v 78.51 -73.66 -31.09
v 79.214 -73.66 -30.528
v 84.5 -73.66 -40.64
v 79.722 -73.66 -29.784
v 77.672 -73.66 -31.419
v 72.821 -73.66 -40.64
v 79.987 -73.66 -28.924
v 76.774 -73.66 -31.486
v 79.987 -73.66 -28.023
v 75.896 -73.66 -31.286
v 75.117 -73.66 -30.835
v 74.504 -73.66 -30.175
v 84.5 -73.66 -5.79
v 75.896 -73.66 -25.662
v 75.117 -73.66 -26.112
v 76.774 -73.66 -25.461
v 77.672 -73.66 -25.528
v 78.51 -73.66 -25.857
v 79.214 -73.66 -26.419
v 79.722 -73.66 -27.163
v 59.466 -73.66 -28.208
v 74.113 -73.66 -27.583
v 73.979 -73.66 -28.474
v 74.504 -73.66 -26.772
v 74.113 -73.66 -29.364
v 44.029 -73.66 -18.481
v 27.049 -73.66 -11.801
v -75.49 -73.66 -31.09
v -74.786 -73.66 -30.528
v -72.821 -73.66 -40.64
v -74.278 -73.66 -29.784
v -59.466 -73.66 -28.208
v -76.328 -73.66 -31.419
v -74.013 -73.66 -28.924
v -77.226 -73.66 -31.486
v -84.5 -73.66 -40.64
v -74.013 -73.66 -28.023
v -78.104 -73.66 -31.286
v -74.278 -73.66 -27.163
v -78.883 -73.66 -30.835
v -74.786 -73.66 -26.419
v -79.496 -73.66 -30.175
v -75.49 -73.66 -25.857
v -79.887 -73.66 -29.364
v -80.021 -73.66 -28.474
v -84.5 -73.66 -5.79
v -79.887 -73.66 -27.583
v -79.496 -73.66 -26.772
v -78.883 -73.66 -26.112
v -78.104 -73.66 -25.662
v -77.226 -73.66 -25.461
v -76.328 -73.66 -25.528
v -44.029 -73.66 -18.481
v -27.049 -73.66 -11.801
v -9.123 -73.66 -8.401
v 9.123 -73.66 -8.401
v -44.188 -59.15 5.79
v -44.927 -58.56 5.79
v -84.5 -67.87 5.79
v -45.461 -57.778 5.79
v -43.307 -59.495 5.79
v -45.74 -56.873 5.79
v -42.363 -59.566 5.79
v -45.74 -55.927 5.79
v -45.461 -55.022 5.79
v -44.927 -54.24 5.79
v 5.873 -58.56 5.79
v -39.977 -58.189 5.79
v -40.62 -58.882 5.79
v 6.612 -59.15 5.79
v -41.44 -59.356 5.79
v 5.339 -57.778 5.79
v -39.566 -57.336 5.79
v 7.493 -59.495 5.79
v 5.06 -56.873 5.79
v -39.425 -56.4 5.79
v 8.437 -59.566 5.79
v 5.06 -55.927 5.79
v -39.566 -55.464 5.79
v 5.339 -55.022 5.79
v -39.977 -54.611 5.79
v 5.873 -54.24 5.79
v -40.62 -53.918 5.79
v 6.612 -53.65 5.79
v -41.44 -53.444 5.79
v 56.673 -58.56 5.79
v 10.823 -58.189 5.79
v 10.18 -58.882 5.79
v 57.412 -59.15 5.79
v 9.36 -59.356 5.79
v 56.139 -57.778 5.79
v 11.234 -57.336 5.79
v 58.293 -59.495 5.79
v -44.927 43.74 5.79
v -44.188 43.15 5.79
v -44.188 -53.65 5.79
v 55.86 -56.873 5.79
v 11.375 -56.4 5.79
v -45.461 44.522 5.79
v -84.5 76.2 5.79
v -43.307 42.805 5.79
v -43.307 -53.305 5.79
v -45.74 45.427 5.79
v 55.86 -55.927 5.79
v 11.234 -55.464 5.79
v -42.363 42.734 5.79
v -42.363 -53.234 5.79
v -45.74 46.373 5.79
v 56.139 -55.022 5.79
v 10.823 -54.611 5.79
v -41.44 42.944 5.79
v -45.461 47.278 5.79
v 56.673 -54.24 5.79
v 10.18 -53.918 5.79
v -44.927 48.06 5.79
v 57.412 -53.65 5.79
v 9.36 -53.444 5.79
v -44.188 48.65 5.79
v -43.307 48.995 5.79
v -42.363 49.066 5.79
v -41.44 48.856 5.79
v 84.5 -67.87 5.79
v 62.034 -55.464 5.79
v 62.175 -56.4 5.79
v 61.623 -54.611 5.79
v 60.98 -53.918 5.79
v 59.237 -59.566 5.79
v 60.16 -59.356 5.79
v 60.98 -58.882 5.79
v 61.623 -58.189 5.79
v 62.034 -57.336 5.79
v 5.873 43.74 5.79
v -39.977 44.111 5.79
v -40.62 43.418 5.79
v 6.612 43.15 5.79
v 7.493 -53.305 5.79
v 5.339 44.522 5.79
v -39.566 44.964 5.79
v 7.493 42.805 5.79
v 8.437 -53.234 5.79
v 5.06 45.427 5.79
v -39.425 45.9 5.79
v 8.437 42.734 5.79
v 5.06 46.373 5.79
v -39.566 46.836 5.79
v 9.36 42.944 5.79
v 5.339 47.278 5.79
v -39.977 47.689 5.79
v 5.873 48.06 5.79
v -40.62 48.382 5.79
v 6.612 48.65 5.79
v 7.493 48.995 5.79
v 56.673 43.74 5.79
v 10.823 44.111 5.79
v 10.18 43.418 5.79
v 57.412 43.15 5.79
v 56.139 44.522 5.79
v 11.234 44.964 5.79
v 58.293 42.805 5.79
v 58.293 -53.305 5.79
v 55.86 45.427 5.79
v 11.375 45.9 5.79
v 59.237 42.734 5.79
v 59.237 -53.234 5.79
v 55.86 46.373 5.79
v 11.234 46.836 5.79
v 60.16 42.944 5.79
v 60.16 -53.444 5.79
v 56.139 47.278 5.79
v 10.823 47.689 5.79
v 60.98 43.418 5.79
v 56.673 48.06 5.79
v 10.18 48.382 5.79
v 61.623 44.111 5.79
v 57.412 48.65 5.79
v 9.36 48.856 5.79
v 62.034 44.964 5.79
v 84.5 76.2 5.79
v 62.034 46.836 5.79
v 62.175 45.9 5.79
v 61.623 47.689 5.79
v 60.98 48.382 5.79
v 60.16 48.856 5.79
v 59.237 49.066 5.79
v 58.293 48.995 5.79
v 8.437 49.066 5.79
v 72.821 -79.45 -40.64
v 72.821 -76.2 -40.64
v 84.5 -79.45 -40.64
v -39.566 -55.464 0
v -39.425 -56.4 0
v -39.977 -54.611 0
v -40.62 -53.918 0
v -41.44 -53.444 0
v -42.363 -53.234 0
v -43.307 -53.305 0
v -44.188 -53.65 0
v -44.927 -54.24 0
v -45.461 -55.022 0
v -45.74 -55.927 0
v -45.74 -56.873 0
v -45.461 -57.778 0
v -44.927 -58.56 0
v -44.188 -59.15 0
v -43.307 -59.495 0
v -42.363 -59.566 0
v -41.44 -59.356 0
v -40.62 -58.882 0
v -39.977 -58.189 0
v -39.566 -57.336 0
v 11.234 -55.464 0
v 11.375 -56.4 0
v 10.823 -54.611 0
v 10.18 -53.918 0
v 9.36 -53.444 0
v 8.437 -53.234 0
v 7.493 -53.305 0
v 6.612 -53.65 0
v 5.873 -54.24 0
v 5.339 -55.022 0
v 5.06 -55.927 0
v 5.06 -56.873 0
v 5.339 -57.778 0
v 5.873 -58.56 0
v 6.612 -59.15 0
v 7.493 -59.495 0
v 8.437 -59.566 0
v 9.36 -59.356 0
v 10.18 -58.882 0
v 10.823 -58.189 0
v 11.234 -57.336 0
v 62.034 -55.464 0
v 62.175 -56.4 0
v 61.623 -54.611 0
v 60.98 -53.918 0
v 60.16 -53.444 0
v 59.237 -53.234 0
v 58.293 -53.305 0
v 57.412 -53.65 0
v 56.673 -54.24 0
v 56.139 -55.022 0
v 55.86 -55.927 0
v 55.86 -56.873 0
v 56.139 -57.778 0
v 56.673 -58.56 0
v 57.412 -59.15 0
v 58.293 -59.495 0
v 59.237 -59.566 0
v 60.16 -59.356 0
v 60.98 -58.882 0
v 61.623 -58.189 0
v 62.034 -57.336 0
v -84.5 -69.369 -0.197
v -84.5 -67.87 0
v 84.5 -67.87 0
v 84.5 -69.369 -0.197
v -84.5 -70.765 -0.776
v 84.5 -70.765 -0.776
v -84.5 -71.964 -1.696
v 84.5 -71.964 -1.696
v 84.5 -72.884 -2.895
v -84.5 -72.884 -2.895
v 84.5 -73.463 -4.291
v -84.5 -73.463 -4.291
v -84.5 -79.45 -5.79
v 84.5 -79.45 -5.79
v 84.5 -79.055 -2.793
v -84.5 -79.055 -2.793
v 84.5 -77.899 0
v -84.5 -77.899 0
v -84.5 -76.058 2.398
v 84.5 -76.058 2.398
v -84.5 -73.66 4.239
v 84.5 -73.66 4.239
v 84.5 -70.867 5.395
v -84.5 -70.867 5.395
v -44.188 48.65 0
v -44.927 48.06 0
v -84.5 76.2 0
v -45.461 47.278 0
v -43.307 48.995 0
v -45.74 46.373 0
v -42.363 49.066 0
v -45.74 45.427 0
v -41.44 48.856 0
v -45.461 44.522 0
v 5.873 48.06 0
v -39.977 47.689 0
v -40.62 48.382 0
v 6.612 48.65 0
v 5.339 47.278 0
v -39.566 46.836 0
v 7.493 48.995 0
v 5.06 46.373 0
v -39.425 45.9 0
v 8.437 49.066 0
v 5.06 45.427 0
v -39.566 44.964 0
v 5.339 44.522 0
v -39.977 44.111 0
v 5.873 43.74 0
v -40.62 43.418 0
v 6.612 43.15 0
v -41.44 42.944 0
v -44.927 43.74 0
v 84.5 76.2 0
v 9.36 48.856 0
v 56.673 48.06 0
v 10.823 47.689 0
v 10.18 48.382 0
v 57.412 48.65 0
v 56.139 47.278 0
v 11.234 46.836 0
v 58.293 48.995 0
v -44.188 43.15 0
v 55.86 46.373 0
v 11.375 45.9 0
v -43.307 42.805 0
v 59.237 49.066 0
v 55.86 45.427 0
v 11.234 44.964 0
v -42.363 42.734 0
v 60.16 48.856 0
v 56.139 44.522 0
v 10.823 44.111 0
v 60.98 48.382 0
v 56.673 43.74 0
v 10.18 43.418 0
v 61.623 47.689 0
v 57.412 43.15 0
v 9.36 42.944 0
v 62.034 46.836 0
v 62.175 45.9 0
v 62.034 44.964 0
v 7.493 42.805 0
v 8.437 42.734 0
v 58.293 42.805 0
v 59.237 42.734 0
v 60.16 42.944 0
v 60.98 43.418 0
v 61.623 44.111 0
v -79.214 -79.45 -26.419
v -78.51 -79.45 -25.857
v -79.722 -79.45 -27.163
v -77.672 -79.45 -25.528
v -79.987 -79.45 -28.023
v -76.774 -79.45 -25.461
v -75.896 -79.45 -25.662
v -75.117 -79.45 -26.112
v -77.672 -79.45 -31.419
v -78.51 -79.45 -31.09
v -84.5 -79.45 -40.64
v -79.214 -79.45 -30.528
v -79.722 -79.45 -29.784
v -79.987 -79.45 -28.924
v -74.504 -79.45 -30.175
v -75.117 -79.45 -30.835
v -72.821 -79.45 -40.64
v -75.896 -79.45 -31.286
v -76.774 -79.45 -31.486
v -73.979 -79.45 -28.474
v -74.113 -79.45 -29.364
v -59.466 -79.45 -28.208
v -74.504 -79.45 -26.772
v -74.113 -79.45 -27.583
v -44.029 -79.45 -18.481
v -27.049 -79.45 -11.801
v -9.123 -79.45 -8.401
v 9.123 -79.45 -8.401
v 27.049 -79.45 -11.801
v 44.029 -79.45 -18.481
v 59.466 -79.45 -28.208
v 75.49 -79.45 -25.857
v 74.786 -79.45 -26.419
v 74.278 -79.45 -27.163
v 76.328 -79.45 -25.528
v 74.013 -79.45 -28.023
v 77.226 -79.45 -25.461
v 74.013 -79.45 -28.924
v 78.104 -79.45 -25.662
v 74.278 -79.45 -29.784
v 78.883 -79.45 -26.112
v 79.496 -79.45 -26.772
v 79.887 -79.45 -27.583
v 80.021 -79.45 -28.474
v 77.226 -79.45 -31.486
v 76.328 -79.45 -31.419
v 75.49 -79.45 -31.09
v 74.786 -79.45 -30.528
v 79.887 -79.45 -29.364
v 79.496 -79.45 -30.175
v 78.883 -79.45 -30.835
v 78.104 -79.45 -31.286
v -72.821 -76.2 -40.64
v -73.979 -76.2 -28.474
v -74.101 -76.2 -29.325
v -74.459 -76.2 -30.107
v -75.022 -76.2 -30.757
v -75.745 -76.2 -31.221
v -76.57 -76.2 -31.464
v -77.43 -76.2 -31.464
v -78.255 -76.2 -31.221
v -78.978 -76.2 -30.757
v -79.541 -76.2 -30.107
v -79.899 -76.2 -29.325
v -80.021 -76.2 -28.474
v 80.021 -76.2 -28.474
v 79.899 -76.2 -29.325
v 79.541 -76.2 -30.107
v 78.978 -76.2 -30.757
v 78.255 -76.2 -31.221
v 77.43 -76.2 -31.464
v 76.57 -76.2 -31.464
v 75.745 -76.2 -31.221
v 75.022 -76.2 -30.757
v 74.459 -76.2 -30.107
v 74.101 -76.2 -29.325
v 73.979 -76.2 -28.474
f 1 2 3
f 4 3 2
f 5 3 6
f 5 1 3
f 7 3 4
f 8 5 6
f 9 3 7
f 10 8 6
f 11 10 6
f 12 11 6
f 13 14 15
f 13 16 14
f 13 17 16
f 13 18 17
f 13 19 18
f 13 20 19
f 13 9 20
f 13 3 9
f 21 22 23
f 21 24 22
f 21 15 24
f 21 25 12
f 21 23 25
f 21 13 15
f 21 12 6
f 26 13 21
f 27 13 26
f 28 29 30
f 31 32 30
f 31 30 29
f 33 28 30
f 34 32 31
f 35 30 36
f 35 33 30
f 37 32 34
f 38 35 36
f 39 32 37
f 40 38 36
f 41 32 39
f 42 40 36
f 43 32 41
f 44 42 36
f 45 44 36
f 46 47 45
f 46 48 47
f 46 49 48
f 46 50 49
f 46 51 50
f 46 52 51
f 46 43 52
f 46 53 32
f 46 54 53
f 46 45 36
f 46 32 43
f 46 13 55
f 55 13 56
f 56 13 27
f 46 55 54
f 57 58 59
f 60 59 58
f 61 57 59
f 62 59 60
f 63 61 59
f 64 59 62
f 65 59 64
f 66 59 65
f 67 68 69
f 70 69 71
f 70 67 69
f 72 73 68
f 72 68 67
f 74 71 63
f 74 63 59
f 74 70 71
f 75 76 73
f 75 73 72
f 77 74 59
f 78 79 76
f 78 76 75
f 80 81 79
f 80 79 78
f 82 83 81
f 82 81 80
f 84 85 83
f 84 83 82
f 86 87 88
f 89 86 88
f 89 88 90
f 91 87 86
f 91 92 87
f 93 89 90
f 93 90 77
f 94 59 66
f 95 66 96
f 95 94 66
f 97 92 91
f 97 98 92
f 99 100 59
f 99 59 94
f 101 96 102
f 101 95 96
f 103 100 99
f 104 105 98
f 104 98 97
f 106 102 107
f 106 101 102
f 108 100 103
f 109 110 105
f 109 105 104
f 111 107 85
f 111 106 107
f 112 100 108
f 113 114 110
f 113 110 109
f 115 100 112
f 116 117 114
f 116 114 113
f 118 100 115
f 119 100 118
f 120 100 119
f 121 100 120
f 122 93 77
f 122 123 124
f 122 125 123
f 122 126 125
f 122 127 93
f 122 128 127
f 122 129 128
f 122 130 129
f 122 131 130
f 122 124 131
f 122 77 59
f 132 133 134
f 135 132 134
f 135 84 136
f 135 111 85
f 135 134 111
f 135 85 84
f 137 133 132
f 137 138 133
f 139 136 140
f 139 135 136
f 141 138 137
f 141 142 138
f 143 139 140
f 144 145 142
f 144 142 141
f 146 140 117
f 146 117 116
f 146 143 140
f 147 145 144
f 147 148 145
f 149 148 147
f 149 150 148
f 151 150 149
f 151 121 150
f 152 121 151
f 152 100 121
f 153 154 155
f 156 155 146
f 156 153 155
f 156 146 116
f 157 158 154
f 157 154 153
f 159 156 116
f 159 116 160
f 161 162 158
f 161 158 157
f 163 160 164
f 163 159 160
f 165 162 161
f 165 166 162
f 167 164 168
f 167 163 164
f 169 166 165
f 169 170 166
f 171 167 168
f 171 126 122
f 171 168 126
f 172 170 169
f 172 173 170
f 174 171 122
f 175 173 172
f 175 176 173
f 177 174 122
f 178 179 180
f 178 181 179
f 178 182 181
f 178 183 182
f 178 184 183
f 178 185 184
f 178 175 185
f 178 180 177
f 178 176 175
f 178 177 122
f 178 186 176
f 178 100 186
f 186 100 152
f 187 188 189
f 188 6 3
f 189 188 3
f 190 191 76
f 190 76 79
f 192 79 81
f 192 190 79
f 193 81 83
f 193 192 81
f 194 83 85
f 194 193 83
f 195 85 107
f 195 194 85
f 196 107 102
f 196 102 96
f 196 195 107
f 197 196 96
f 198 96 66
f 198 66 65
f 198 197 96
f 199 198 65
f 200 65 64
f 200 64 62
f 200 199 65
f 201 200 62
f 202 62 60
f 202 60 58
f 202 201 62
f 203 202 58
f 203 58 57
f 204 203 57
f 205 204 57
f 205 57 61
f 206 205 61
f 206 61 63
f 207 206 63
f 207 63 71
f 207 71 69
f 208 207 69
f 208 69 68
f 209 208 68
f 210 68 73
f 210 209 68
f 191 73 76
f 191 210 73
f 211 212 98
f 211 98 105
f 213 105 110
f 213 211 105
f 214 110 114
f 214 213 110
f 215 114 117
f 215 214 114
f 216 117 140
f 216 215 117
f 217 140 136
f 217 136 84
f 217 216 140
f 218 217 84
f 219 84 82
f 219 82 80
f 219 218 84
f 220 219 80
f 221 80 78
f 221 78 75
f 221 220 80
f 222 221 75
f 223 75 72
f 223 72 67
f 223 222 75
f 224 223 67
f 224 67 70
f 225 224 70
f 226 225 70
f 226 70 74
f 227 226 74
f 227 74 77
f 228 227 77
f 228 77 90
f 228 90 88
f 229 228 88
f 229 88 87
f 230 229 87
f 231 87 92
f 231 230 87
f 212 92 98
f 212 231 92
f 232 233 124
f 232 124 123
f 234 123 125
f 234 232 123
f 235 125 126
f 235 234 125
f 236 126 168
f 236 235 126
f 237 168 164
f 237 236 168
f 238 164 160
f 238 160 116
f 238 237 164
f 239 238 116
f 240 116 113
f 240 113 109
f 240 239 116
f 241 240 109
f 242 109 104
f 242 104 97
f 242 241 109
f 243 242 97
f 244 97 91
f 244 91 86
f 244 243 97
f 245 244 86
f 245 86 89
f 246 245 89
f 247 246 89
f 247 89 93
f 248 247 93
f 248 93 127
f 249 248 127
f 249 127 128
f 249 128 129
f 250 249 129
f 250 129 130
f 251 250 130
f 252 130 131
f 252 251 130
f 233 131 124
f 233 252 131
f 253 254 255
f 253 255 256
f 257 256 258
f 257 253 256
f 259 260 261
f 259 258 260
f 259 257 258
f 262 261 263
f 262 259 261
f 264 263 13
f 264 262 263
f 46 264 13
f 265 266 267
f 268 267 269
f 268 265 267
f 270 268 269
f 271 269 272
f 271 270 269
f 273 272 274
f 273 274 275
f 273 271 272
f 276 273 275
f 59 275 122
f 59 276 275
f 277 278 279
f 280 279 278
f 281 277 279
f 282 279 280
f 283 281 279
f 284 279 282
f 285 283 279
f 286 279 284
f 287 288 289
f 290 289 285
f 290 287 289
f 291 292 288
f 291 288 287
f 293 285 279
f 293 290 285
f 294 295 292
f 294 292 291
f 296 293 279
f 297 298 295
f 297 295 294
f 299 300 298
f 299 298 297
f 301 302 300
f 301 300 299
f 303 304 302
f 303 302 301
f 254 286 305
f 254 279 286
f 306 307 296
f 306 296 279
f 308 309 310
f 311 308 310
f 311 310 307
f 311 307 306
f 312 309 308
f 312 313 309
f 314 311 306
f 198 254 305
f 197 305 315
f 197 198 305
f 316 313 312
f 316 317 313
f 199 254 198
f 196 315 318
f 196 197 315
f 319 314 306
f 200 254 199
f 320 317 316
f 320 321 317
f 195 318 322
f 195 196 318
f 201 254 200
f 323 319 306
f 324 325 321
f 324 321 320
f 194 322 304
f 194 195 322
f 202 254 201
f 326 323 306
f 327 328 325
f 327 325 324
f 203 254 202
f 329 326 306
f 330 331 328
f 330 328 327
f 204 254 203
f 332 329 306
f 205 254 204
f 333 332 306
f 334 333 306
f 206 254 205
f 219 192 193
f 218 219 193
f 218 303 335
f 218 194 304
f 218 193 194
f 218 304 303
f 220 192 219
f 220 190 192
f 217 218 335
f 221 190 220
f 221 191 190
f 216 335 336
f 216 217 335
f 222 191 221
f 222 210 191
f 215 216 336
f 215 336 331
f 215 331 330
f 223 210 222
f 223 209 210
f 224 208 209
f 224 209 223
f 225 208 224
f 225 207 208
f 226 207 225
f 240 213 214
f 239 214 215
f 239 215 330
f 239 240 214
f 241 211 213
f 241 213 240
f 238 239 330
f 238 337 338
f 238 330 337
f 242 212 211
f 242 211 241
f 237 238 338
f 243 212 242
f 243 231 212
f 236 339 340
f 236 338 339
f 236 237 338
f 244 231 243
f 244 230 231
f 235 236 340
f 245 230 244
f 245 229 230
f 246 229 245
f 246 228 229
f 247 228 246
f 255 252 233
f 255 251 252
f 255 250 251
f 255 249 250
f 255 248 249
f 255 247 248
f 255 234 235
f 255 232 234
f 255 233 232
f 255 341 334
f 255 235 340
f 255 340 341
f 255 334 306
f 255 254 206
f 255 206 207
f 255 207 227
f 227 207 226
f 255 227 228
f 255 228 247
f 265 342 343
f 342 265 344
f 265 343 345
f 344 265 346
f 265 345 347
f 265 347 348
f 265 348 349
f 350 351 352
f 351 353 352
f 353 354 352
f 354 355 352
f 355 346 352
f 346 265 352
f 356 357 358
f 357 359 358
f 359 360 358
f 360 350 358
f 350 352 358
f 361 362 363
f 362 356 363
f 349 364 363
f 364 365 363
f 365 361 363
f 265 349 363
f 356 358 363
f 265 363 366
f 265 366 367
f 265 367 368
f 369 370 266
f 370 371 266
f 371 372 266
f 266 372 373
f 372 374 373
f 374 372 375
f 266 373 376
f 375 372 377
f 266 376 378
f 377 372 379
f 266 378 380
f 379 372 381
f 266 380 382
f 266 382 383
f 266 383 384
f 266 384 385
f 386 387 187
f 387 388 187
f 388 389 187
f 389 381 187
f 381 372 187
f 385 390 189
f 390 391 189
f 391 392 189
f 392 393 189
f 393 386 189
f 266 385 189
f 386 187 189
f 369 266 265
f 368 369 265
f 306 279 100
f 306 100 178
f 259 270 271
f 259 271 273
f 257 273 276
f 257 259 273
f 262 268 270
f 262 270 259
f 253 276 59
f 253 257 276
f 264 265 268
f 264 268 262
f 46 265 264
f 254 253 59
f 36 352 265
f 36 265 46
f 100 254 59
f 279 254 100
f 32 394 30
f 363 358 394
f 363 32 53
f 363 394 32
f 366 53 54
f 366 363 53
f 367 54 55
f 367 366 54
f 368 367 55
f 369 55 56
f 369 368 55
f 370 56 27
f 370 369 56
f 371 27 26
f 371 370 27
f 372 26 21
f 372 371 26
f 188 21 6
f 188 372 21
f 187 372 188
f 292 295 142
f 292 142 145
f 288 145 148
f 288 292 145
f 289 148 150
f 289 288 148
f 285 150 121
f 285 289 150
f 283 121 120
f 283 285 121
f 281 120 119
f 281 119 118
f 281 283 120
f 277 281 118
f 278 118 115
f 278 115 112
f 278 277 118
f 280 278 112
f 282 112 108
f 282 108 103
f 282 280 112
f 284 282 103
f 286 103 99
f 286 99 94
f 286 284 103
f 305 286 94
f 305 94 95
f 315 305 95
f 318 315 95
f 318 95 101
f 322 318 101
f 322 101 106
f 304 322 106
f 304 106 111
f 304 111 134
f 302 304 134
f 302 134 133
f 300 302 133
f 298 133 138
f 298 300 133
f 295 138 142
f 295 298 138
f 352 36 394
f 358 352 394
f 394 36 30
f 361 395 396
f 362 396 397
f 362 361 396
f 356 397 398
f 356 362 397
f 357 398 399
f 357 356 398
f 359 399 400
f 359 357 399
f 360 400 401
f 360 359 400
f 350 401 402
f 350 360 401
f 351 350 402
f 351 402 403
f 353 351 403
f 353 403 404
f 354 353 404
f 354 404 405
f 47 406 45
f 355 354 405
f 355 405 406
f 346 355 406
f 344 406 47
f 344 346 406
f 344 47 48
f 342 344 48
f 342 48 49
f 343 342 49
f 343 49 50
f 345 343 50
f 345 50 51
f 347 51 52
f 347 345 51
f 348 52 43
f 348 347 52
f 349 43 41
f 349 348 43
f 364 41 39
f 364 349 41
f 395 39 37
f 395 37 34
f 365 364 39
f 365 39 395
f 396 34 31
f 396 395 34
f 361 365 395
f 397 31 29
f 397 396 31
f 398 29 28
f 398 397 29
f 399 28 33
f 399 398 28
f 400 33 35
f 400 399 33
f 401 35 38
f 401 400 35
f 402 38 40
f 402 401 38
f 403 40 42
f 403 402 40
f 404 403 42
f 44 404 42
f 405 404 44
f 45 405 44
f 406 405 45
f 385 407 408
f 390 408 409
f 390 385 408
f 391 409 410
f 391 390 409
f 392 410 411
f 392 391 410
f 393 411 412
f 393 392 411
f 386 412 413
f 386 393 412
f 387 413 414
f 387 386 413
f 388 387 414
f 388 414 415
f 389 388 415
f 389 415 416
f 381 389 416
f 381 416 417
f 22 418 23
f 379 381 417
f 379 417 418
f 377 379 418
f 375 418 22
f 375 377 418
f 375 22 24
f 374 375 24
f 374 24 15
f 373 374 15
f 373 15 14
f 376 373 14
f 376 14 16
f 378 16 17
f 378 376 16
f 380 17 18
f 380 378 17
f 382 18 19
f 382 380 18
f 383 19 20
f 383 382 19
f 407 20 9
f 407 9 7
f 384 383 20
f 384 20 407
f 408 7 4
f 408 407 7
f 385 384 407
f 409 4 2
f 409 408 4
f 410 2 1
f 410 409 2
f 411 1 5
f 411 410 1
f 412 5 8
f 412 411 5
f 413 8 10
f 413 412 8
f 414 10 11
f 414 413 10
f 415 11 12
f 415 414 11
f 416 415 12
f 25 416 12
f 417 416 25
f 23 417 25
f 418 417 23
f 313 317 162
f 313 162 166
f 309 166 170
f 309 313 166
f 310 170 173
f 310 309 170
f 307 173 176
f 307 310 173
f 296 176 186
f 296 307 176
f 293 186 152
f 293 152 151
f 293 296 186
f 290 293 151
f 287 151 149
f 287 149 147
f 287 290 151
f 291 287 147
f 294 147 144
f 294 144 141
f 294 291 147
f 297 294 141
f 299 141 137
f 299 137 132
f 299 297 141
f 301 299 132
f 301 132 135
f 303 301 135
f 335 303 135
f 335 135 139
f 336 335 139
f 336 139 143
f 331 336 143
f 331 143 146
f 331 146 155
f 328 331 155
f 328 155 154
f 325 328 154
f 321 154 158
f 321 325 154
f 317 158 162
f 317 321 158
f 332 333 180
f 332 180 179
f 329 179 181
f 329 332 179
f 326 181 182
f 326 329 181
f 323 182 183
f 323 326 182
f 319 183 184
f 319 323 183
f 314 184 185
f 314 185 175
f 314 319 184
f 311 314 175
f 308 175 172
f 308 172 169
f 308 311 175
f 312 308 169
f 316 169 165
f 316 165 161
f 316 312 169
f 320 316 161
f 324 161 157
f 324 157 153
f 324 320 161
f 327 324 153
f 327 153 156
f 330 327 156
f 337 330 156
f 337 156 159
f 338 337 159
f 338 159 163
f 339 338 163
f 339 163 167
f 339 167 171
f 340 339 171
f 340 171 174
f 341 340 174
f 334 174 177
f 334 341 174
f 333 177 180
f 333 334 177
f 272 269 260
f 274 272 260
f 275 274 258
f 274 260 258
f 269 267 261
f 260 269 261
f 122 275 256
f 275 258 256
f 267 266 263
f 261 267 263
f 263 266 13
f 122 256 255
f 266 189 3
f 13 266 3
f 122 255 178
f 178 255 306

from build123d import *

# Parameters (mm, degrees)
SKETCH1_W                  = 169
SKETCH1_H                  = 152.4
BOSS_EXTRUDE1_DEPTH        = 2.54
SKETCH2_W                  = 169
SKETCH2_H                  = 2.54
BOSS_EXTRUDE2_DEPTH        = 40.64
CUT_EXTRUDE1_REACH         = 122.823
SKETCH4_R                  = 3.175
CUT_EXTRUDE2_REACH         = 178.776
SKETCH3_R                  = 3.020871564
SKETCH3_R_2                = 97.5
CONVERT_SOLID1_START       = -5.790000104
CONVERT_SOLID1_OUTLINE_W   = 169
CONVERT_SOLID1_OUTLINE_H   = 149.86
CONVERT_SOLID1_OUTLINE_R   = 3.175
CONVERT_SOLID1_DEPTH       = 11.580006304
CONVERT_SOLID1_START_2     = -40.64
CONVERT_SOLID1_2_OUTLINE_W = 169
CONVERT_SOLID1_2_OUTLINE_H = 3.2500062
CONVERT_SOLID1_2_DEPTH     = 43.18
CONVERT_SOLID1_START_3     = 2.54
CONVERT_SOLID1_3_OUTLINE_W = 169
CONVERT_SOLID1_3_OUTLINE_H = 2.54
CONVERT_SOLID1_3_DEPTH     = 2.060276352
CONVERT_SOLID1_START_4     = -67.869999896
CONVERT_SOLID1_4_OUTLINE_W = 169
CONVERT_SOLID1_4_OUTLINE_H = 5.790000104
CONVERT_SOLID1_4_DEPTH     = 144.069999896
CONVERT_SOLID1_START_5     = -79.4500062
CONVERT_SOLID1_5_OUTLINE_R = 3.020871564
CONVERT_SOLID1_5_DEPTH     = 3.2500062
CONVERT_SOLID1_6_OUTLINE_W = 169
CONVERT_SOLID1_6_OUTLINE_H = 2.54
CONVERT_SOLID1_6_DEPTH     = 0.546460785
CONVERT_SOLID1_START_6     = -85
CONVERT_SOLID1_7_DEPTH     = 170


with BuildPart() as part:
    # Sketch1 → Boss-Extrude1 (new body)
    with BuildSketch(Plane.XY):
        Rectangle(SKETCH1_W, SKETCH1_H)
    extrude(amount=BOSS_EXTRUDE1_DEPTH)

    # Sketch2 → Boss-Extrude2 (add)
    with BuildSketch(Plane(origin=(0, 0, 0), x_dir=(-1, 0, 0), z_dir=(0, 0, -1))):
        with Locations((0, -74.93)):
            Rectangle(SKETCH2_W, SKETCH2_H)
    extrude(amount=BOSS_EXTRUDE2_DEPTH)

    # Sketch4 → Cut-Extrude1 (cut, up to next)
    with BuildSketch(Plane(origin=(0, 0, 0), x_dir=(-1, 0, 0), z_dir=(0, 0, -1)), mode=Mode.PRIVATE) as cut_extrude1_sk1:
        with Locations((-59, 45.9)):
            Circle(SKETCH4_R)
    cut_extrude1_tool1 = extrude(cut_extrude1_sk1.sketch, amount=-CUT_EXTRUDE1_REACH, mode=Mode.PRIVATE) & part.part
    # Sketch4 → Cut-Extrude1 (cut, up to next)
    with BuildSketch(Plane(origin=(0, 0, 0), x_dir=(-1, 0, 0), z_dir=(0, 0, -1)), mode=Mode.PRIVATE) as cut_extrude1_sk2:
        with Locations((-59, -56.4)):
            Circle(SKETCH4_R)
    cut_extrude1_tool2 = extrude(cut_extrude1_sk2.sketch, amount=-CUT_EXTRUDE1_REACH, mode=Mode.PRIVATE) & part.part
    # Sketch4 → Cut-Extrude1 (cut, up to next)
    with BuildSketch(Plane(origin=(0, 0, 0), x_dir=(-1, 0, 0), z_dir=(0, 0, -1)), mode=Mode.PRIVATE) as cut_extrude1_sk3:
        with Locations((-8.2, 45.9)):
            Circle(SKETCH4_R)
    cut_extrude1_tool3 = extrude(cut_extrude1_sk3.sketch, amount=-CUT_EXTRUDE1_REACH, mode=Mode.PRIVATE) & part.part
    # Sketch4 → Cut-Extrude1 (cut, up to next)
    with BuildSketch(Plane(origin=(0, 0, 0), x_dir=(-1, 0, 0), z_dir=(0, 0, -1)), mode=Mode.PRIVATE) as cut_extrude1_sk4:
        with Locations((42.6, 45.9)):
            Circle(SKETCH4_R)
    cut_extrude1_tool4 = extrude(cut_extrude1_sk4.sketch, amount=-CUT_EXTRUDE1_REACH, mode=Mode.PRIVATE) & part.part
    # Sketch4 → Cut-Extrude1 (cut, up to next)
    with BuildSketch(Plane(origin=(0, 0, 0), x_dir=(-1, 0, 0), z_dir=(0, 0, -1)), mode=Mode.PRIVATE) as cut_extrude1_sk5:
        with Locations((42.6, -56.4)):
            Circle(SKETCH4_R)
    cut_extrude1_tool5 = extrude(cut_extrude1_sk5.sketch, amount=-CUT_EXTRUDE1_REACH, mode=Mode.PRIVATE) & part.part
    # Sketch4 → Cut-Extrude1 (cut, up to next)
    with BuildSketch(Plane(origin=(0, 0, 0), x_dir=(-1, 0, 0), z_dir=(0, 0, -1)), mode=Mode.PRIVATE) as cut_extrude1_sk6:
        with Locations((-8.2, -56.4)):
            Circle(SKETCH4_R)
    cut_extrude1_tool6 = extrude(cut_extrude1_sk6.sketch, amount=-CUT_EXTRUDE1_REACH, mode=Mode.PRIVATE) & part.part
    add(cut_extrude1_tool1.solids().sort_by_distance((59, 45.9, 0))[0], mode=Mode.SUBTRACT)
    add(cut_extrude1_tool2.solids().sort_by_distance((59, -56.4, 0))[0], mode=Mode.SUBTRACT)
    add(cut_extrude1_tool3.solids().sort_by_distance((8.2, 45.9, 0))[0], mode=Mode.SUBTRACT)
    add(cut_extrude1_tool4.solids().sort_by_distance((-42.6, 45.9, 0))[0], mode=Mode.SUBTRACT)
    add(cut_extrude1_tool5.solids().sort_by_distance((-42.6, -56.4, 0))[0], mode=Mode.SUBTRACT)
    add(cut_extrude1_tool6.solids().sort_by_distance((8.2, -56.4, 0))[0], mode=Mode.SUBTRACT)

    # Sketch3 → Cut-Extrude2 (cut, up to next)
    with BuildSketch(Plane(origin=(0, -73.66, 0), x_dir=(1, 0, 0), z_dir=(0, 1, 0)), mode=Mode.PRIVATE) as cut_extrude2_sk1:
        with Locations(Location((77, 28.473587136, 0), (0, 0, 180))):
            Circle(SKETCH3_R)
    cut_extrude2_tool1 = extrude(cut_extrude2_sk1.sketch, amount=-CUT_EXTRUDE2_REACH, mode=Mode.PRIVATE) & part.part
    # Sketch3 → Cut-Extrude2 (cut, up to next)
    with BuildSketch(Plane(origin=(0, -73.66, 0), x_dir=(1, 0, 0), z_dir=(0, 1, 0)), mode=Mode.PRIVATE) as cut_extrude2_sk2:
        with Locations(Location((-77, 28.473587136, 0), (0, 0, 180))):
            Circle(SKETCH3_R)
    cut_extrude2_tool2 = extrude(cut_extrude2_sk2.sketch, amount=-CUT_EXTRUDE2_REACH, mode=Mode.PRIVATE) & part.part
    # Sketch3 → Cut-Extrude2 (cut, up to next)
    with BuildSketch(Plane(origin=(0, -73.66, 0), x_dir=(1, 0, 0), z_dir=(0, 1, 0)), mode=Mode.PRIVATE) as cut_extrude2_sk3:
        with Locations((0, 105.473587136)):
            Circle(SKETCH3_R_2)
    cut_extrude2_tool3 = extrude(cut_extrude2_sk3.sketch, amount=-CUT_EXTRUDE2_REACH, mode=Mode.PRIVATE) & part.part
    add(cut_extrude2_tool1.solids().sort_by_distance((77, -73.66, -28.473587))[0], mode=Mode.SUBTRACT)
    add(cut_extrude2_tool2.solids().sort_by_distance((-77, -73.66, -28.473587))[0], mode=Mode.SUBTRACT)
    add(cut_extrude2_tool3.solids().sort_by_distance((0, -73.66, -105.473587))[0], mode=Mode.SUBTRACT)

    # Convert-Solid1: read off the stored shape, not the designer's step
    # Convert-Solid1 outline → Convert-Solid1 (add)
    with BuildSketch(Plane.XY.offset(CONVERT_SOLID1_START)):
        with Locations((0, 1.27)):
            Rectangle(CONVERT_SOLID1_OUTLINE_W, CONVERT_SOLID1_OUTLINE_H)
        with Locations((-42.6, -56.4)):
            Circle(CONVERT_SOLID1_OUTLINE_R, mode=Mode.SUBTRACT)
        with Locations((8.2, -56.4)):
            Circle(CONVERT_SOLID1_OUTLINE_R, mode=Mode.SUBTRACT)
        with Locations((59, -56.4)):
            Circle(CONVERT_SOLID1_OUTLINE_R, mode=Mode.SUBTRACT)
        with Locations((-42.6, 45.9)):
            Circle(CONVERT_SOLID1_OUTLINE_R, mode=Mode.SUBTRACT)
        with Locations((8.2, 45.9)):
            Circle(CONVERT_SOLID1_OUTLINE_R, mode=Mode.SUBTRACT)
        with Locations((59, 45.9)):
            Circle(CONVERT_SOLID1_OUTLINE_R, mode=Mode.SUBTRACT)
    extrude(amount=CONVERT_SOLID1_DEPTH)

    # Convert-Solid1 2 outline → Convert-Solid1 2 (add)
    with BuildSketch(Plane.XY.offset(CONVERT_SOLID1_START_2)):
        with Locations((0, -77.8250031)):
            Rectangle(CONVERT_SOLID1_2_OUTLINE_W, CONVERT_SOLID1_2_OUTLINE_H)
    extrude(amount=CONVERT_SOLID1_2_DEPTH)

    # Convert-Solid1 3 outline → Convert-Solid1 3 (add)
    with BuildSketch(Plane.XY.offset(CONVERT_SOLID1_START_3)):
        with Locations((0, -74.93)):
            Rectangle(CONVERT_SOLID1_3_OUTLINE_W, CONVERT_SOLID1_3_OUTLINE_H)
    extrude(amount=CONVERT_SOLID1_3_DEPTH)

    # Convert-Solid1 4 outline → Convert-Solid1 4 (cut)
    with BuildSketch(Plane(origin=(0, 0, 0), x_dir=(1, 0, 0), z_dir=(0, 1, 0)).offset(CONVERT_SOLID1_START_4)):
        with Locations((0, 2.895000052)):
            Rectangle(CONVERT_SOLID1_4_OUTLINE_W, CONVERT_SOLID1_4_OUTLINE_H)
    extrude(amount=CONVERT_SOLID1_4_DEPTH, mode=Mode.SUBTRACT)

    # Convert-Solid1 5 outline → Convert-Solid1 5 (cut)
    with BuildSketch(Plane(origin=(0, 0, 0), x_dir=(1, 0, 0), z_dir=(0, 1, 0)).offset(CONVERT_SOLID1_START_5)):
        with BuildLine():
            Line((72.820711196, 40.64), (-72.820711196, 40.64))
            ThreePointArc((-72.820711196, 40.64), (0, 7.973587136), (72.820711196, 40.64))
        make_face()
        with Locations((-77, 28.473587136)):
            Circle(CONVERT_SOLID1_5_OUTLINE_R)
        with Locations((77, 28.473587136)):
            Circle(CONVERT_SOLID1_5_OUTLINE_R)
    extrude(amount=CONVERT_SOLID1_5_DEPTH, mode=Mode.SUBTRACT)

    # Convert-Solid1 6 outline → Convert-Solid1 6 (cut)
    with BuildSketch(Plane(origin=(0, 0, 0), x_dir=(1, 0, 0), z_dir=(0, 1, 0)).offset(CONVERT_SOLID1_START_5)):
        with Locations((0, -1.27)):
            Rectangle(CONVERT_SOLID1_6_OUTLINE_W, CONVERT_SOLID1_6_OUTLINE_H)
    extrude(amount=CONVERT_SOLID1_6_DEPTH, mode=Mode.SUBTRACT)

    # Convert-Solid1 7 outline → Convert-Solid1 7 (cut)
    with BuildSketch(Plane.YZ.offset(CONVERT_SOLID1_START_6)):
        with BuildLine():
            Line((-67.869999896, -5.790000104), (-67.869999896, 0))
            ThreePointArc((-67.869999896, 0), (-71.964148233, -1.695851767), (-73.66, -5.790000104))
            Line((-73.66, -5.790000104), (-67.869999896, -5.790000104))
        make_face()
        with BuildLine():
            ThreePointArc((-79.4500062, -5.790000104), (-76.05830088, 2.39830088), (-67.869999896, 5.7900062))
            Line((-67.869999896, 5.7900062), (-73.66, 5.7900062))
            Line((-73.66, 5.7900062), (-73.66, 4.600276352))
            Line((-73.66, 4.600276352), (-76.2, 4.600276352))
            Line((-76.2, 4.600276352), (-76.2, 2.54))
            Line((-76.2, 2.54), (-78.903545415, 2.54))
            Line((-78.903545415, 2.54), (-78.903545415, 0))
            Line((-78.903545415, 0), (-79.4500062, 0))
            Line((-79.4500062, 0), (-79.4500062, -5.790000104))
        make_face()
    extrude(amount=CONVERT_SOLID1_7_DEPTH, mode=Mode.SUBTRACT)


solid = part.part
